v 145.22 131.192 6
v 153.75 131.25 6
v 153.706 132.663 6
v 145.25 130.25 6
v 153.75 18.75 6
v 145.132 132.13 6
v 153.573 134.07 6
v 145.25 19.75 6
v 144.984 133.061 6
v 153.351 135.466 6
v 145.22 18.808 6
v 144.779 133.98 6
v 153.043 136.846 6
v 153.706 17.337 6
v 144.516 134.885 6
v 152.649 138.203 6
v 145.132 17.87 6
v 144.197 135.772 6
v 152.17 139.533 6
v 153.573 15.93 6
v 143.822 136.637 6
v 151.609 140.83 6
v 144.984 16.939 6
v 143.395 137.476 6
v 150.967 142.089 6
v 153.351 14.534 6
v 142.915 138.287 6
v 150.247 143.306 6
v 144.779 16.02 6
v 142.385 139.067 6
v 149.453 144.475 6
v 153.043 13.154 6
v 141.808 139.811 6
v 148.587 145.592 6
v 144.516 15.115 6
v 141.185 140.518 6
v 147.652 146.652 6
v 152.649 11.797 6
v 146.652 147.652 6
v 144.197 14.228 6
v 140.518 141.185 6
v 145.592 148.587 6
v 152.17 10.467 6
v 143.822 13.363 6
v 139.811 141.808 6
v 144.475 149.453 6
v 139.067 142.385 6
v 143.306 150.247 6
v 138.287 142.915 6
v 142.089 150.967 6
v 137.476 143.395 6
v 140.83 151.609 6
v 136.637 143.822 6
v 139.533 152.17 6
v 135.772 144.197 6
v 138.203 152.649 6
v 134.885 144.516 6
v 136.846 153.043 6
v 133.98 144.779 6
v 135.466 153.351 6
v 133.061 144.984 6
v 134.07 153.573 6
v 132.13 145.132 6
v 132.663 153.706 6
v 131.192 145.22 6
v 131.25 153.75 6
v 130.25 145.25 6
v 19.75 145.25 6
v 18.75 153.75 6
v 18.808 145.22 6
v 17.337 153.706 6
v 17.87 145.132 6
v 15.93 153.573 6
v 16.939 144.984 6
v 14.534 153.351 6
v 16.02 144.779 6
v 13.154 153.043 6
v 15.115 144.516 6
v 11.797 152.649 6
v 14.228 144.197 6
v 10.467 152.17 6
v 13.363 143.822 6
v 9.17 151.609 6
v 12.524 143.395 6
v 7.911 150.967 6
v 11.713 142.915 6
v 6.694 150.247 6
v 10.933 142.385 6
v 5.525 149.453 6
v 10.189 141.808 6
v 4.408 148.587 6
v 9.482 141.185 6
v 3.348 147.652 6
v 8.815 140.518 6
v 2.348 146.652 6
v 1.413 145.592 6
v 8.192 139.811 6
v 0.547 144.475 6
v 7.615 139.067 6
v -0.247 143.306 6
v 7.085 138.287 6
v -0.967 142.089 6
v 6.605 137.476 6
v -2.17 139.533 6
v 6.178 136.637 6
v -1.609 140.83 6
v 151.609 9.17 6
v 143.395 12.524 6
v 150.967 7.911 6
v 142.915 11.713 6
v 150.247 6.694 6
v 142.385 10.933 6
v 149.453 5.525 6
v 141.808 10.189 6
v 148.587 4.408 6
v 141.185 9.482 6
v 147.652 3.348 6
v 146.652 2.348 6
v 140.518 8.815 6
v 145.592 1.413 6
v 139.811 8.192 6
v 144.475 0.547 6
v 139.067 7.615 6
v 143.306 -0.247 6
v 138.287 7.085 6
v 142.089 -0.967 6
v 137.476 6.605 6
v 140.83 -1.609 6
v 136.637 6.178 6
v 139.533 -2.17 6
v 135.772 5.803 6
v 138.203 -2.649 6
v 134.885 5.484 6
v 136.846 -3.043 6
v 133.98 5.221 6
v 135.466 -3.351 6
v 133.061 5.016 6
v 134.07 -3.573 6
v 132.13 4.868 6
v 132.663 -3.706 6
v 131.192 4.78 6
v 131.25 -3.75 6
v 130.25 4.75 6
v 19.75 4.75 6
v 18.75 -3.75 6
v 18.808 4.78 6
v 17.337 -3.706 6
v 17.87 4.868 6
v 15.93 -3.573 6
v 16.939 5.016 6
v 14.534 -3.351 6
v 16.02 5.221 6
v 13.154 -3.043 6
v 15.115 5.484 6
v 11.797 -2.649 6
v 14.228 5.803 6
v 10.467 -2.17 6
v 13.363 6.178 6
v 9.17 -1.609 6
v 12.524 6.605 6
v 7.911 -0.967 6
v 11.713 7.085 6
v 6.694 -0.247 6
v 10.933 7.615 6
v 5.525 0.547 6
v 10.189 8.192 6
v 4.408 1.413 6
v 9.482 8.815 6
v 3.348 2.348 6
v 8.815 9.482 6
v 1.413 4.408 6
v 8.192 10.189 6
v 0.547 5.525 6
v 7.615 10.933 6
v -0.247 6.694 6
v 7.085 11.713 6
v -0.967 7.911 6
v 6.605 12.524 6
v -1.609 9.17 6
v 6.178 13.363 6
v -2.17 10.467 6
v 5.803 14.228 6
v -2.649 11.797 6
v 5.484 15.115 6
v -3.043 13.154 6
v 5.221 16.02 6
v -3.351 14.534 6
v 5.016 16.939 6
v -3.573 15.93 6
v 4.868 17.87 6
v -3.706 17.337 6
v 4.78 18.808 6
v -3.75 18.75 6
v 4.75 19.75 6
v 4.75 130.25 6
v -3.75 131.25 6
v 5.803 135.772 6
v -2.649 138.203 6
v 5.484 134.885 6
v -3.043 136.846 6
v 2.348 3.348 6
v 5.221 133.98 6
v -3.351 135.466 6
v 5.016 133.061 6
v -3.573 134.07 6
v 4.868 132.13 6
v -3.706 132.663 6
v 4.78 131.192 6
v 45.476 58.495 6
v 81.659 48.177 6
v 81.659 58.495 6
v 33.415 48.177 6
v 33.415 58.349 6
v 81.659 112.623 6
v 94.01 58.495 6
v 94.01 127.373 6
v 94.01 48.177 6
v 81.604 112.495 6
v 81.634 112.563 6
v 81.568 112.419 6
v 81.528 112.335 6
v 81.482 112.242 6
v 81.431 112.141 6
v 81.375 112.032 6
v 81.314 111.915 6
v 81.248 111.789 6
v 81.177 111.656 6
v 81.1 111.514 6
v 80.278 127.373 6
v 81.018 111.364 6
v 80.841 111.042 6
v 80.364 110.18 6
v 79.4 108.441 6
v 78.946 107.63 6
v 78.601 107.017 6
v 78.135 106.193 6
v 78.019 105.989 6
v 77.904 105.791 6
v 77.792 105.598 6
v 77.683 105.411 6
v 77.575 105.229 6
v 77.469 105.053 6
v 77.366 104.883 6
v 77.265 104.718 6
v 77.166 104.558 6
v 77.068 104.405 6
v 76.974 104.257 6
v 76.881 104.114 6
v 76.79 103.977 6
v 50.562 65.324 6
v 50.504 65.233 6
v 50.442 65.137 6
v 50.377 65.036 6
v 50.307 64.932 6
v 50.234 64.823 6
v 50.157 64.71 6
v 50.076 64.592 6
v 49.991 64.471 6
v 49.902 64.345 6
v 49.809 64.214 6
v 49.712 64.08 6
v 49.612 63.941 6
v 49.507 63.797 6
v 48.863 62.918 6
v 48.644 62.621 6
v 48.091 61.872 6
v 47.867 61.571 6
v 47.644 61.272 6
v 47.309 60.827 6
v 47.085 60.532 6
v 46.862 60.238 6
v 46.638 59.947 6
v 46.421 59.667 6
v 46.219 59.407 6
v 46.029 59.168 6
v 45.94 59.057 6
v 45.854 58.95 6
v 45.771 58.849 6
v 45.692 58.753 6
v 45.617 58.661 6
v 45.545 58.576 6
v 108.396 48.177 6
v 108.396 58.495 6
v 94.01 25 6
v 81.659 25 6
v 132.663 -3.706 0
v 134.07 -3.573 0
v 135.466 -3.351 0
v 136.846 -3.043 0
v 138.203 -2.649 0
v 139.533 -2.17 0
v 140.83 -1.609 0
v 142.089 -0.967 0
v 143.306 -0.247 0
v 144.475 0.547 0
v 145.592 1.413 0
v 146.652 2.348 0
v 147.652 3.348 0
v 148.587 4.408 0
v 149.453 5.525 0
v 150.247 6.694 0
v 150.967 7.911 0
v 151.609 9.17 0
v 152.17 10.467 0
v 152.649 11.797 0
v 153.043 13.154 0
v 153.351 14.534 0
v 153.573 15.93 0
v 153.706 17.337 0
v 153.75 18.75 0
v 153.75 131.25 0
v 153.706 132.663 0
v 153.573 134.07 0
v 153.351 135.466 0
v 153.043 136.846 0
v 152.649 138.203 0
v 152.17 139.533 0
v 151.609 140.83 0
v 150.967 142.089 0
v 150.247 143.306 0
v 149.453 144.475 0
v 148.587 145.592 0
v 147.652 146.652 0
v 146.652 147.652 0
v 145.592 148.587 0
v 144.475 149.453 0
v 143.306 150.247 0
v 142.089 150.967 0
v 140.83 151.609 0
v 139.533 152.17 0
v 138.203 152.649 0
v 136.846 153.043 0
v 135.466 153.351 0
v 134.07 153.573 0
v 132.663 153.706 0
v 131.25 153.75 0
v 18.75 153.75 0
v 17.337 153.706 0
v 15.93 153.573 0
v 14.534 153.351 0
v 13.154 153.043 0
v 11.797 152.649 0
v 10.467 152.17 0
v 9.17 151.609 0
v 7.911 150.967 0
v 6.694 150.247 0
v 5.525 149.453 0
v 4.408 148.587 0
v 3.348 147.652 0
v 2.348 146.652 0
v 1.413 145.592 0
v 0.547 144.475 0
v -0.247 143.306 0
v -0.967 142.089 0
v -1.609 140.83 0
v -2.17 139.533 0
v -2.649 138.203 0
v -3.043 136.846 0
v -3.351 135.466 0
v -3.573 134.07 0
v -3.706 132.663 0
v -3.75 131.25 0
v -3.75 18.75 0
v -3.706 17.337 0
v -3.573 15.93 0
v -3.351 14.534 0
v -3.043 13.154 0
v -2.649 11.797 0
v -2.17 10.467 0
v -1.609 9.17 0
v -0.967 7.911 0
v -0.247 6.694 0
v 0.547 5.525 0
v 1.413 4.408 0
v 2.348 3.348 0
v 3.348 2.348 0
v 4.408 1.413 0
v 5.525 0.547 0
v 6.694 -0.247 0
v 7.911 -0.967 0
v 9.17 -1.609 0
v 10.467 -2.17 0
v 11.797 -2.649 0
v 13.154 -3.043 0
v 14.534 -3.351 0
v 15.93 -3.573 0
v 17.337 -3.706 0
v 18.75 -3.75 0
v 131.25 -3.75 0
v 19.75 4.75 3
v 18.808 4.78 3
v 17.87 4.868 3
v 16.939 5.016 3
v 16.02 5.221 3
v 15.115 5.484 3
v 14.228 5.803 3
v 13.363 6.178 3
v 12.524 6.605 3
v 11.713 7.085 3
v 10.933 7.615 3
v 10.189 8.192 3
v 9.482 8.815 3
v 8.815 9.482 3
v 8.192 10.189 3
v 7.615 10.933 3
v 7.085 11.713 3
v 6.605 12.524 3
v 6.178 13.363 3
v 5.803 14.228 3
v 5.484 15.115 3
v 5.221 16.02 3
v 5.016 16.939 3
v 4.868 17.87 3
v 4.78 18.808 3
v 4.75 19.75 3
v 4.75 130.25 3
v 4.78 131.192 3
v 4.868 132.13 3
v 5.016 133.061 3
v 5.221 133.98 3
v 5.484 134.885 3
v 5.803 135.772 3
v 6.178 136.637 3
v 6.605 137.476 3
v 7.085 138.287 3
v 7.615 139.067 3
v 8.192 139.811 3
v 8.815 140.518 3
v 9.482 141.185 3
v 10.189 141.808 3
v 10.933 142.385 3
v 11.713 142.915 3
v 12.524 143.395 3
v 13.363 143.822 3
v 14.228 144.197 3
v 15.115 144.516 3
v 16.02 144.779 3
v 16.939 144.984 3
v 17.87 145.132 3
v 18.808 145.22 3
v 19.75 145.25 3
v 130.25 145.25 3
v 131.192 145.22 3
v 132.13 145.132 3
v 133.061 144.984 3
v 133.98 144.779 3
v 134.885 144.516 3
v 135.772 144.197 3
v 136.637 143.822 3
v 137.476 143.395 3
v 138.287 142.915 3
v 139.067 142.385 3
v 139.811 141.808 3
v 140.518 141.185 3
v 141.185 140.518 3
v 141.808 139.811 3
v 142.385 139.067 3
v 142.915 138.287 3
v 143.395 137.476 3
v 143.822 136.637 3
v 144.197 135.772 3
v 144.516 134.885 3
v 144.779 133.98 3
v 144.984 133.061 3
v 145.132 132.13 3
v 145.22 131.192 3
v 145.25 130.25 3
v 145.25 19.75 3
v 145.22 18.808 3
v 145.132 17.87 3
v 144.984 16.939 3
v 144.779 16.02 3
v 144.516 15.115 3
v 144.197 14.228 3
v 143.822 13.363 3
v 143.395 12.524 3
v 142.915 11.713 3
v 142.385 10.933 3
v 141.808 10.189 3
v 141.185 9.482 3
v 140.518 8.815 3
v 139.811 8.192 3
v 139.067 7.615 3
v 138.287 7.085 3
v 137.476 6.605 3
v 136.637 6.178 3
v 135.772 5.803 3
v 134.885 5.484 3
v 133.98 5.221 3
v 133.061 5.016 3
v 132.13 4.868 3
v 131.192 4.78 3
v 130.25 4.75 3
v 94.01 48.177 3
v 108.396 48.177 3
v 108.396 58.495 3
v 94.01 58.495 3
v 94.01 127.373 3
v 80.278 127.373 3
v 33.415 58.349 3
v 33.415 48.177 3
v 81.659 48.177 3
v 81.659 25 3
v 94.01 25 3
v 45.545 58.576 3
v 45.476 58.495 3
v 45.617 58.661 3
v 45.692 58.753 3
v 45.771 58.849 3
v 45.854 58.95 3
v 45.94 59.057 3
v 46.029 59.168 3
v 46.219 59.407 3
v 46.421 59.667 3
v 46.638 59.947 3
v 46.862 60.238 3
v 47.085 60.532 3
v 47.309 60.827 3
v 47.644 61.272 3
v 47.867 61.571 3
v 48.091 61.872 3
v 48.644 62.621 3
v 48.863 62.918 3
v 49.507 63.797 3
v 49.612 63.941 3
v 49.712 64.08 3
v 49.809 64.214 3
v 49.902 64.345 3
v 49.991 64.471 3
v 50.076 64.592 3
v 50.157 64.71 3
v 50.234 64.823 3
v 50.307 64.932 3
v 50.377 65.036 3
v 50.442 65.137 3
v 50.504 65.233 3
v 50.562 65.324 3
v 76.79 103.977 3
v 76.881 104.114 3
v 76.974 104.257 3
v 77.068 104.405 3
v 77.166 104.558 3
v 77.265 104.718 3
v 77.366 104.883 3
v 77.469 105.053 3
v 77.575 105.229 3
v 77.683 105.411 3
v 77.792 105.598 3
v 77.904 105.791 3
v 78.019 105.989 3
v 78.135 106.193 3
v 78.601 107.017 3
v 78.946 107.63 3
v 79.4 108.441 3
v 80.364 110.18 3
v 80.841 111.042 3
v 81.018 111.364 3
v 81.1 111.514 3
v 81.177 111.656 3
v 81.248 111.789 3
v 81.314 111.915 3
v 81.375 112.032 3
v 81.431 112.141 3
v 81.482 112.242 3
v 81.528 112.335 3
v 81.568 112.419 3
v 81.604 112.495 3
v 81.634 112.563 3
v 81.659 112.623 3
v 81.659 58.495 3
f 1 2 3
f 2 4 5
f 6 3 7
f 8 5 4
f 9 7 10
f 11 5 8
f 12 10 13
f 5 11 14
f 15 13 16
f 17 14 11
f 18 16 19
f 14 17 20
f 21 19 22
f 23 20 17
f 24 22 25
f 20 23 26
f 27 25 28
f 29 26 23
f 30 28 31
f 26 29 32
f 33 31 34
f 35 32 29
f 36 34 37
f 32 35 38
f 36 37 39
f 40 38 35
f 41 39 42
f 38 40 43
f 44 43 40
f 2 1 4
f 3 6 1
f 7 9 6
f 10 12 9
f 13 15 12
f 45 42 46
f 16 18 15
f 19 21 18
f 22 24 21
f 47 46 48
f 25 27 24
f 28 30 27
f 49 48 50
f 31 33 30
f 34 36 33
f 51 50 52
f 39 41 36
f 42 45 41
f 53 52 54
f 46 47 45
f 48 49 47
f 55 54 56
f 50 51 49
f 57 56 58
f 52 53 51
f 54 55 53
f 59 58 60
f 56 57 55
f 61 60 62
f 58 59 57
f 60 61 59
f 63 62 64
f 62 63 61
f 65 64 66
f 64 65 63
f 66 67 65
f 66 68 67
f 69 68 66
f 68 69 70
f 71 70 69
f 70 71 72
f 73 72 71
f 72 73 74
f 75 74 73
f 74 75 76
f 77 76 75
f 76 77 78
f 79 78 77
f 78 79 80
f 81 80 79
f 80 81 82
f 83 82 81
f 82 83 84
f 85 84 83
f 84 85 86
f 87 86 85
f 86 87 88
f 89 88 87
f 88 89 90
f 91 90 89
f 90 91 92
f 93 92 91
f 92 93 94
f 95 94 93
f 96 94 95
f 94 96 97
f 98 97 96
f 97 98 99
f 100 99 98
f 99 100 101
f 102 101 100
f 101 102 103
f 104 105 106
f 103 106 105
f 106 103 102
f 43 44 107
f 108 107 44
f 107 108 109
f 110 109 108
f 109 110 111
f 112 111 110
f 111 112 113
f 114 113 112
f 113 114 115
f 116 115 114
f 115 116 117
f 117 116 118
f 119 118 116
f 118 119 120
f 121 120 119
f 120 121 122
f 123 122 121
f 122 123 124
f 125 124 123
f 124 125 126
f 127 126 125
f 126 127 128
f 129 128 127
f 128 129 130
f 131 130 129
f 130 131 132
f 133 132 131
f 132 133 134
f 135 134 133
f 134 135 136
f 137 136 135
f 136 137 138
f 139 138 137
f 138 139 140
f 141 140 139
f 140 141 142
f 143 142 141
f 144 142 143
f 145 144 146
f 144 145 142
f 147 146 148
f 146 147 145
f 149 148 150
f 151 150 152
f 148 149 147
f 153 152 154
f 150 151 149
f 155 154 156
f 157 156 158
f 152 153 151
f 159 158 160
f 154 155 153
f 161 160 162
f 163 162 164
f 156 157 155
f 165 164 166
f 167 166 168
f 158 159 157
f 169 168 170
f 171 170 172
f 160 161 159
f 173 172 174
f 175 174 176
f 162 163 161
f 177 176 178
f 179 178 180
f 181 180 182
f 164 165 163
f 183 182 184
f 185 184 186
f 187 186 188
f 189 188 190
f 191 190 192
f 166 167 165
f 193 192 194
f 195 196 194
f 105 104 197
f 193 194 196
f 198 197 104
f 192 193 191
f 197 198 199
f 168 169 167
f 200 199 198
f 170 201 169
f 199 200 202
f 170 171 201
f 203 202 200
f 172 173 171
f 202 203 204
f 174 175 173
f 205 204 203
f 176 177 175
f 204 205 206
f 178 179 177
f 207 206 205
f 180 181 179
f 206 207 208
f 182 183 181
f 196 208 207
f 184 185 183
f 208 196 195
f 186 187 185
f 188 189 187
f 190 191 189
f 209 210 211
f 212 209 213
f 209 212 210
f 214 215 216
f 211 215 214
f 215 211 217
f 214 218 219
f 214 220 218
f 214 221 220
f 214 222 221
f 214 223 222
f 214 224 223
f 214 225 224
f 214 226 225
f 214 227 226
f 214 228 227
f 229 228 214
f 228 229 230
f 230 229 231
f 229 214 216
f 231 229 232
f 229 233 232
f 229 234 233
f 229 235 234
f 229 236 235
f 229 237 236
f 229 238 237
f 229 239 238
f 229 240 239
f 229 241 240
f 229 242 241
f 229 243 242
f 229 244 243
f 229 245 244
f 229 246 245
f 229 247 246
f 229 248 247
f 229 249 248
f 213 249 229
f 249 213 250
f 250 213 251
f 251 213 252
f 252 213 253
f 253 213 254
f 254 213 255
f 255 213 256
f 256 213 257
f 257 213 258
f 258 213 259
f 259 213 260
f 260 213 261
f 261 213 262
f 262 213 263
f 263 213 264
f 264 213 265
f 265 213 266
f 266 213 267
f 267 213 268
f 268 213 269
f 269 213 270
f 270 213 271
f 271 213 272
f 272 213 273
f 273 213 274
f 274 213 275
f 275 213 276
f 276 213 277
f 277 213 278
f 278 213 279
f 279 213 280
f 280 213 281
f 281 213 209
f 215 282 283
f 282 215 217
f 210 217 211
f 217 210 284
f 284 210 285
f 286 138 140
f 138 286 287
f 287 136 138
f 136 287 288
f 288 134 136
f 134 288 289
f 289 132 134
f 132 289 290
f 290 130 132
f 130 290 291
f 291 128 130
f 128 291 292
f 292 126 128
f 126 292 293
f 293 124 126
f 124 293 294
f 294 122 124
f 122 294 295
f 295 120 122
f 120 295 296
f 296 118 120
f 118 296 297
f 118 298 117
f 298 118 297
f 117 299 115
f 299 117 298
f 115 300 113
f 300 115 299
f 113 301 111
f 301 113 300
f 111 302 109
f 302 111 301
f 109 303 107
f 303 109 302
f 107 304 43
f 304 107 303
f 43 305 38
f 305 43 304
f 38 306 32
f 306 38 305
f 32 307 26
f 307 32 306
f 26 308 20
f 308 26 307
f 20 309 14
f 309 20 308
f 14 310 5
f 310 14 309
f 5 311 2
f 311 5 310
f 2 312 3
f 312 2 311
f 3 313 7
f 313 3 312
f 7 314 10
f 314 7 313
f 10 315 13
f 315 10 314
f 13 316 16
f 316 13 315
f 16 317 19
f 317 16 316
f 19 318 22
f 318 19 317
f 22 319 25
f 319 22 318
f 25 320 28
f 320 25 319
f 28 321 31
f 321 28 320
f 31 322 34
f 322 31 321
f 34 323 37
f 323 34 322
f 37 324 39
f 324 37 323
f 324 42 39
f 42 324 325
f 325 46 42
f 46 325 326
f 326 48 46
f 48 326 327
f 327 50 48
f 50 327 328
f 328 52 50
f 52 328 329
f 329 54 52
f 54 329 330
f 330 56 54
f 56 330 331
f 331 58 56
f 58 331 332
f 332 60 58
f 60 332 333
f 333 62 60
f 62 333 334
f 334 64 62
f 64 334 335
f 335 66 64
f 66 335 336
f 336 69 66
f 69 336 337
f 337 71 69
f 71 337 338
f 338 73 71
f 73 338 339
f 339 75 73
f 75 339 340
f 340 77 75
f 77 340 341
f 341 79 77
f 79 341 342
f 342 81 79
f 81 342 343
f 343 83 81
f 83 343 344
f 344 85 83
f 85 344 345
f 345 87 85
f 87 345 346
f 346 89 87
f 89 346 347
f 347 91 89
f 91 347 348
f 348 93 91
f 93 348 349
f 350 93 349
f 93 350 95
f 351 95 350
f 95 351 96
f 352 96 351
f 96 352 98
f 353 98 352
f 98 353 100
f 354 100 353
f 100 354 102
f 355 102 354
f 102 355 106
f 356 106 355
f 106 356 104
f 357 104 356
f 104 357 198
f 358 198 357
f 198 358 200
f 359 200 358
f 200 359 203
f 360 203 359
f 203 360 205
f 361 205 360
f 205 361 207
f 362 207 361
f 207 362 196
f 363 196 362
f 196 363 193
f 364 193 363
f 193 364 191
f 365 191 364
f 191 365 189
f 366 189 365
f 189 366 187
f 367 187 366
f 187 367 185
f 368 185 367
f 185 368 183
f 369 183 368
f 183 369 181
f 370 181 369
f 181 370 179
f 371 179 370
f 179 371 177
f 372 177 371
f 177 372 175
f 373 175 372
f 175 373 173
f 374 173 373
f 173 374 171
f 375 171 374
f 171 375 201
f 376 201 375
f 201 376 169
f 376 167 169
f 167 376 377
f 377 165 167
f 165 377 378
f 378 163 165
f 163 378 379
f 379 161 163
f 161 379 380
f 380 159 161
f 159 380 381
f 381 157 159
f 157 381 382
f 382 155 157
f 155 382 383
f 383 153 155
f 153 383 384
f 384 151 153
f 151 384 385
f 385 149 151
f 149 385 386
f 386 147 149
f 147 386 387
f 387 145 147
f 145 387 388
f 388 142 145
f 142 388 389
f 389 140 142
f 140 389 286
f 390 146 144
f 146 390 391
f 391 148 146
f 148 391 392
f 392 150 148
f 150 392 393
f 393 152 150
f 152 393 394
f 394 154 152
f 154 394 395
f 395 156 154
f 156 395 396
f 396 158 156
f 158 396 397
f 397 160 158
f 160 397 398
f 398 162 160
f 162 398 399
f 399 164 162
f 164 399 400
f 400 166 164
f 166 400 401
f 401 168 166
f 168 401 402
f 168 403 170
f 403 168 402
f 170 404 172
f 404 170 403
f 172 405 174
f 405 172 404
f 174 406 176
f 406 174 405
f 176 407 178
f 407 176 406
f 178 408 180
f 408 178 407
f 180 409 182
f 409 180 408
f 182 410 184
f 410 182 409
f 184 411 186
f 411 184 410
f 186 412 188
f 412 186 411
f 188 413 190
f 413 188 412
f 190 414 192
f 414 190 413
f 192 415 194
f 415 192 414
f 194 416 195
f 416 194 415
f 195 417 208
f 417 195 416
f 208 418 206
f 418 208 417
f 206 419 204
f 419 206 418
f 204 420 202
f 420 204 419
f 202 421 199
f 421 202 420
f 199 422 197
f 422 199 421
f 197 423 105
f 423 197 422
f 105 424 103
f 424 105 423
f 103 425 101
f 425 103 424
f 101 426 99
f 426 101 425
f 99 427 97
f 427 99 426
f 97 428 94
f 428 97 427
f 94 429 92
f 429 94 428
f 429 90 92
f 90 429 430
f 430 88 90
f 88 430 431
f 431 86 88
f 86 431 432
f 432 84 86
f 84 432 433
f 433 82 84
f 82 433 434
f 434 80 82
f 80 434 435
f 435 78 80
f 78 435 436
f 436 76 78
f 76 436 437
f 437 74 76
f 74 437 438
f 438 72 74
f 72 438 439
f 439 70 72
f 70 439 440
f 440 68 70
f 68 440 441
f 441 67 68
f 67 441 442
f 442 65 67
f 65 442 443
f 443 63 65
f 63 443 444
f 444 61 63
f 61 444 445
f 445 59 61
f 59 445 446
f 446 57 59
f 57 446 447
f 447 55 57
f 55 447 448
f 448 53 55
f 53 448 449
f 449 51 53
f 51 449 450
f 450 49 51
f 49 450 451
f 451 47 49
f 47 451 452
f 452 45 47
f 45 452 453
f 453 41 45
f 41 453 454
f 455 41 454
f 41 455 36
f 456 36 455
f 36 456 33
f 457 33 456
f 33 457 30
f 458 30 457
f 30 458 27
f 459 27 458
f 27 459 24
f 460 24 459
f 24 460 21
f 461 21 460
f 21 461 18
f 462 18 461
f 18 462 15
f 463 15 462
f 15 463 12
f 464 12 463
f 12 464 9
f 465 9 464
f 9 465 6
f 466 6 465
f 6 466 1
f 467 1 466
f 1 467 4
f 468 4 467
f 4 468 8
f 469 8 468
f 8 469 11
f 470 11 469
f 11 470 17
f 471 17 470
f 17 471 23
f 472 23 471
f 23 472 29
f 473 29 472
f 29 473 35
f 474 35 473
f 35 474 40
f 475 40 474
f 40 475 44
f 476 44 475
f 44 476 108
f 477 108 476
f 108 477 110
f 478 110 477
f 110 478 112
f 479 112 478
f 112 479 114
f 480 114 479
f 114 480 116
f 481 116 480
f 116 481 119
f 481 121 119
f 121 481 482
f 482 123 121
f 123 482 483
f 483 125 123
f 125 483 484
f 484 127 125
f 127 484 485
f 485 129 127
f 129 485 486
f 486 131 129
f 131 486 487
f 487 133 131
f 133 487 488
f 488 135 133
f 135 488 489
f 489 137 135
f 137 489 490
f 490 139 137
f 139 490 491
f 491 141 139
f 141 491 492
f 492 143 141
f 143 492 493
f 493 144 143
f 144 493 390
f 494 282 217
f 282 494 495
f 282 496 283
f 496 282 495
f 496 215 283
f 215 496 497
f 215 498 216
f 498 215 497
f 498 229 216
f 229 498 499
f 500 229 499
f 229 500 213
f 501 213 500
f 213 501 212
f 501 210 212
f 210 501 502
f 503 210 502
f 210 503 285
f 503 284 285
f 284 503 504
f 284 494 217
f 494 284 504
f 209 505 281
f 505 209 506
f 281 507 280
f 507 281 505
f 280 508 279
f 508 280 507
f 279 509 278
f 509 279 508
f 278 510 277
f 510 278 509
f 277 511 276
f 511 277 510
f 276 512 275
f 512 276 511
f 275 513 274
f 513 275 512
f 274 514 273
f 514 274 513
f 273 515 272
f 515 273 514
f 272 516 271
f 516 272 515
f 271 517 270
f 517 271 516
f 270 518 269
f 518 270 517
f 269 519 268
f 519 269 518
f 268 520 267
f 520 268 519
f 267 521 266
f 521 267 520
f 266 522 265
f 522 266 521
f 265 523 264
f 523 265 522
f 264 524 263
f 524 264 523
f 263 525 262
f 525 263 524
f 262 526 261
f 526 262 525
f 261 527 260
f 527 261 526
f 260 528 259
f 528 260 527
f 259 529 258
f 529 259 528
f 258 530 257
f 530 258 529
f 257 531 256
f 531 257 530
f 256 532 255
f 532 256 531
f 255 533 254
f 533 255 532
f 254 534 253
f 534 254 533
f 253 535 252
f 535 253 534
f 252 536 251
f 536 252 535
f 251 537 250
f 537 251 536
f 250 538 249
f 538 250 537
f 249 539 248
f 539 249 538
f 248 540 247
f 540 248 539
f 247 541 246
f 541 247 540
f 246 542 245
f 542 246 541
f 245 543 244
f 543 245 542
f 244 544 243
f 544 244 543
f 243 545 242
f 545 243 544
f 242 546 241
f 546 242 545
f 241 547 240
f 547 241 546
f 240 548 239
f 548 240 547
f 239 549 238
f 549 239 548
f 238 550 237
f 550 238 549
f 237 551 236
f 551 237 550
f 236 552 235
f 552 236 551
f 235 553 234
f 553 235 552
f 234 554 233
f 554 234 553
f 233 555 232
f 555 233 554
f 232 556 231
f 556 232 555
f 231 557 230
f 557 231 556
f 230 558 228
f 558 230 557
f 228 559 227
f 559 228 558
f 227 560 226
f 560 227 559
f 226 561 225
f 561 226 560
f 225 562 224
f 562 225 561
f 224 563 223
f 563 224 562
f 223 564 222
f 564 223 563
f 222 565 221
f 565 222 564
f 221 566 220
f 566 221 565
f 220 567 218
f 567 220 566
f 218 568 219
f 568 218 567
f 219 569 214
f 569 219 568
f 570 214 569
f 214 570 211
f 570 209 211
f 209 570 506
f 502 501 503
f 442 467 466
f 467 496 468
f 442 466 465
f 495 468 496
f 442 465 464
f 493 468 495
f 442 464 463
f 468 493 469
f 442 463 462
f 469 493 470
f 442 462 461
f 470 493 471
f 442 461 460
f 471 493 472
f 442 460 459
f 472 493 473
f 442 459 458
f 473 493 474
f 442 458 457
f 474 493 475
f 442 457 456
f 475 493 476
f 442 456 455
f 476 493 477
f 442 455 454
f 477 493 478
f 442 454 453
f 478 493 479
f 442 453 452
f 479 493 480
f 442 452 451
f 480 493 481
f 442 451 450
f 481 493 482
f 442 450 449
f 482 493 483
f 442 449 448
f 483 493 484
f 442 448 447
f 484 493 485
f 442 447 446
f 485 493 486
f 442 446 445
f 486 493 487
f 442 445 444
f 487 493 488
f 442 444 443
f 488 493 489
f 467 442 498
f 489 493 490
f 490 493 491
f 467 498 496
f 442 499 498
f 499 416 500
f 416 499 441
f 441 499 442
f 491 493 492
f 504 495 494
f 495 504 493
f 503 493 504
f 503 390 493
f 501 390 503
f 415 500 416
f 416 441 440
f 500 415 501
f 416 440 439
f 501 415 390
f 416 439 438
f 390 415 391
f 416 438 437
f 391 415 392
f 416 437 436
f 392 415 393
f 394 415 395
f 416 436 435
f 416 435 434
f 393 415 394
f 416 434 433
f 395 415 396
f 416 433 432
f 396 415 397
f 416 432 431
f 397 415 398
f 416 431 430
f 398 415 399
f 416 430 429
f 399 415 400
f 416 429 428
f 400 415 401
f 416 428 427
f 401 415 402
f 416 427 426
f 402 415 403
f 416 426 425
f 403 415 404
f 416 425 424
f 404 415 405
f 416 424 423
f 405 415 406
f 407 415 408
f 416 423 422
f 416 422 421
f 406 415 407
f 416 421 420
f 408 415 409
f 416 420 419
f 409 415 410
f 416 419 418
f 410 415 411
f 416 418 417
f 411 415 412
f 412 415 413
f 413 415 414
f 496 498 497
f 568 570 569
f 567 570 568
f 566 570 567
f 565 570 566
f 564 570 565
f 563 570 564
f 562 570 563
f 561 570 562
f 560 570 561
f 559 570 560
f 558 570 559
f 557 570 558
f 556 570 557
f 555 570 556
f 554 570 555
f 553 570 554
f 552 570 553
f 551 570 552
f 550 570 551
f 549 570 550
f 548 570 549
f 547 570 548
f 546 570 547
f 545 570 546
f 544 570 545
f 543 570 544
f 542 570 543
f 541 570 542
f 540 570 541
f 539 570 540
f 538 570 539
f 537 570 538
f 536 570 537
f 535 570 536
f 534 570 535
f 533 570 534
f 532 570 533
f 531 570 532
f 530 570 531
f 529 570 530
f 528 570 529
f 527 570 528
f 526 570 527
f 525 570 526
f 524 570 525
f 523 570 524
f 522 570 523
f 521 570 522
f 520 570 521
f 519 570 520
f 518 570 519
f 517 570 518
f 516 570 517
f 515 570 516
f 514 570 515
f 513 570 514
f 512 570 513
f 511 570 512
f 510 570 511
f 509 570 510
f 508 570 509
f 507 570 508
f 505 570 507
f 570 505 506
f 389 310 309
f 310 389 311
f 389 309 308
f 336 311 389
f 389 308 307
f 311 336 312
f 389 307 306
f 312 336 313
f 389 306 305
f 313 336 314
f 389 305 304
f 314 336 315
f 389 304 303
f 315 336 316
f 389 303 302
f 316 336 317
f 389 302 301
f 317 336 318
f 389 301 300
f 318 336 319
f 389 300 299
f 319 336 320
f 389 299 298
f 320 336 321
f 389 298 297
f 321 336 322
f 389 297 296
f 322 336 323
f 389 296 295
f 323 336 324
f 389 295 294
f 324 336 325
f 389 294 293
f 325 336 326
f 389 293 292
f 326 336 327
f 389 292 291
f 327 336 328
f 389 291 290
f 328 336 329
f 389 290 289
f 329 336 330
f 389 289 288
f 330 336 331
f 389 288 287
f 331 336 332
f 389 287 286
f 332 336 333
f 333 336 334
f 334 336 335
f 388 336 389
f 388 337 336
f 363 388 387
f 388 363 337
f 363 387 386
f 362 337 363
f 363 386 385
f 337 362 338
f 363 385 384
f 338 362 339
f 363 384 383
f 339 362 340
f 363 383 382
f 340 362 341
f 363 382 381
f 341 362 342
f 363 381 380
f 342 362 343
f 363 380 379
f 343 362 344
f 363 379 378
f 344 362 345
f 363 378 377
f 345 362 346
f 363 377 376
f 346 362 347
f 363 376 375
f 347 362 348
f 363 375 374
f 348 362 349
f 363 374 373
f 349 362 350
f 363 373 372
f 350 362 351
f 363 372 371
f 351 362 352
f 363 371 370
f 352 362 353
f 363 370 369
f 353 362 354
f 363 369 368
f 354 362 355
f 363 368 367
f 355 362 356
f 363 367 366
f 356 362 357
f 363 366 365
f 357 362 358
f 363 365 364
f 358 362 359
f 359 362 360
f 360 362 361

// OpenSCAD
/* [Text] */

// The number on the sign
number_text = "4";

// the height of the sign in millimeters
height = 150;

/* [Thickness] */

// Thickness of the backplate in mm.
backplate_thickness = 3;

// How much the text and border is raises from backplate
number_thickness = 3;

/* [Fine tuning] */

// Roundness of corners: 0 = almost square, 100 = a circle
corner_roundness = 25; // [0:100]

// Border thickness as percentage of height
border_thickness = 5; // [0:50]

// This should usually not need to be changed
aspect = 1;

/* [Hidden] */
width = (height + height * 0.53 * (len(str(number_text)) - 1)) * aspect;

$fn=100;

border_roundness = corner_roundness / 100;

number_sign();

module anti_round(r){
    difference(){
        square(2*r,center=false);
        circle(r);
    }
}

module rounded_corner(xpos, ypos, dia, degrees) {
    translate([xpos,ypos]) {
	rotate(degrees) difference() {
	    square(dia);
	     anti_round(dia);
	}
    }
}

module rounded_square(height, width, roundness) {
    difference() {
	scale([width/height,1]) square(height);
	square(roundness);
	translate([width-roundness, 0]) square(roundness);
	translate([0, height-roundness]) square(roundness);
	translate([width-roundness, height-roundness]) square(roundness);
    }
    rounded_corner(roundness, roundness, roundness, 180);
    rounded_corner(roundness, height-roundness, roundness, 90);
    rounded_corner(width-roundness, roundness, roundness, 270);
    rounded_corner(width-roundness, height-roundness, roundness, 0);
}


module rounded_border(height, width, roundness, rwidth) {
    minkowski () {
	difference() {
	    rounded_square(height, width, roundness);
	    translate([1,1]) rounded_square(height-2, width-2, roundness);
	}
	circle(rwidth/2);
    }
}


module number_sign() {
    fudge = 0.1;
    color("black") translate([0,0,backplate_thickness-fudge]) {
	linear_extrude(number_thickness + fudge) {
	    rounded_border(height, width, height * border_roundness / 2,
			   height * border_thickness/100);
	    translate([height/5, height/6]) scale(height/14) text(str(number_text));
	}
    }

    color("white")
	linear_extrude(backplate_thickness) {
	minkowski () {
	    rounded_square(height, width, height * border_roundness / 2);
	    circle(height * border_thickness/100/2);
	}
    }
}
